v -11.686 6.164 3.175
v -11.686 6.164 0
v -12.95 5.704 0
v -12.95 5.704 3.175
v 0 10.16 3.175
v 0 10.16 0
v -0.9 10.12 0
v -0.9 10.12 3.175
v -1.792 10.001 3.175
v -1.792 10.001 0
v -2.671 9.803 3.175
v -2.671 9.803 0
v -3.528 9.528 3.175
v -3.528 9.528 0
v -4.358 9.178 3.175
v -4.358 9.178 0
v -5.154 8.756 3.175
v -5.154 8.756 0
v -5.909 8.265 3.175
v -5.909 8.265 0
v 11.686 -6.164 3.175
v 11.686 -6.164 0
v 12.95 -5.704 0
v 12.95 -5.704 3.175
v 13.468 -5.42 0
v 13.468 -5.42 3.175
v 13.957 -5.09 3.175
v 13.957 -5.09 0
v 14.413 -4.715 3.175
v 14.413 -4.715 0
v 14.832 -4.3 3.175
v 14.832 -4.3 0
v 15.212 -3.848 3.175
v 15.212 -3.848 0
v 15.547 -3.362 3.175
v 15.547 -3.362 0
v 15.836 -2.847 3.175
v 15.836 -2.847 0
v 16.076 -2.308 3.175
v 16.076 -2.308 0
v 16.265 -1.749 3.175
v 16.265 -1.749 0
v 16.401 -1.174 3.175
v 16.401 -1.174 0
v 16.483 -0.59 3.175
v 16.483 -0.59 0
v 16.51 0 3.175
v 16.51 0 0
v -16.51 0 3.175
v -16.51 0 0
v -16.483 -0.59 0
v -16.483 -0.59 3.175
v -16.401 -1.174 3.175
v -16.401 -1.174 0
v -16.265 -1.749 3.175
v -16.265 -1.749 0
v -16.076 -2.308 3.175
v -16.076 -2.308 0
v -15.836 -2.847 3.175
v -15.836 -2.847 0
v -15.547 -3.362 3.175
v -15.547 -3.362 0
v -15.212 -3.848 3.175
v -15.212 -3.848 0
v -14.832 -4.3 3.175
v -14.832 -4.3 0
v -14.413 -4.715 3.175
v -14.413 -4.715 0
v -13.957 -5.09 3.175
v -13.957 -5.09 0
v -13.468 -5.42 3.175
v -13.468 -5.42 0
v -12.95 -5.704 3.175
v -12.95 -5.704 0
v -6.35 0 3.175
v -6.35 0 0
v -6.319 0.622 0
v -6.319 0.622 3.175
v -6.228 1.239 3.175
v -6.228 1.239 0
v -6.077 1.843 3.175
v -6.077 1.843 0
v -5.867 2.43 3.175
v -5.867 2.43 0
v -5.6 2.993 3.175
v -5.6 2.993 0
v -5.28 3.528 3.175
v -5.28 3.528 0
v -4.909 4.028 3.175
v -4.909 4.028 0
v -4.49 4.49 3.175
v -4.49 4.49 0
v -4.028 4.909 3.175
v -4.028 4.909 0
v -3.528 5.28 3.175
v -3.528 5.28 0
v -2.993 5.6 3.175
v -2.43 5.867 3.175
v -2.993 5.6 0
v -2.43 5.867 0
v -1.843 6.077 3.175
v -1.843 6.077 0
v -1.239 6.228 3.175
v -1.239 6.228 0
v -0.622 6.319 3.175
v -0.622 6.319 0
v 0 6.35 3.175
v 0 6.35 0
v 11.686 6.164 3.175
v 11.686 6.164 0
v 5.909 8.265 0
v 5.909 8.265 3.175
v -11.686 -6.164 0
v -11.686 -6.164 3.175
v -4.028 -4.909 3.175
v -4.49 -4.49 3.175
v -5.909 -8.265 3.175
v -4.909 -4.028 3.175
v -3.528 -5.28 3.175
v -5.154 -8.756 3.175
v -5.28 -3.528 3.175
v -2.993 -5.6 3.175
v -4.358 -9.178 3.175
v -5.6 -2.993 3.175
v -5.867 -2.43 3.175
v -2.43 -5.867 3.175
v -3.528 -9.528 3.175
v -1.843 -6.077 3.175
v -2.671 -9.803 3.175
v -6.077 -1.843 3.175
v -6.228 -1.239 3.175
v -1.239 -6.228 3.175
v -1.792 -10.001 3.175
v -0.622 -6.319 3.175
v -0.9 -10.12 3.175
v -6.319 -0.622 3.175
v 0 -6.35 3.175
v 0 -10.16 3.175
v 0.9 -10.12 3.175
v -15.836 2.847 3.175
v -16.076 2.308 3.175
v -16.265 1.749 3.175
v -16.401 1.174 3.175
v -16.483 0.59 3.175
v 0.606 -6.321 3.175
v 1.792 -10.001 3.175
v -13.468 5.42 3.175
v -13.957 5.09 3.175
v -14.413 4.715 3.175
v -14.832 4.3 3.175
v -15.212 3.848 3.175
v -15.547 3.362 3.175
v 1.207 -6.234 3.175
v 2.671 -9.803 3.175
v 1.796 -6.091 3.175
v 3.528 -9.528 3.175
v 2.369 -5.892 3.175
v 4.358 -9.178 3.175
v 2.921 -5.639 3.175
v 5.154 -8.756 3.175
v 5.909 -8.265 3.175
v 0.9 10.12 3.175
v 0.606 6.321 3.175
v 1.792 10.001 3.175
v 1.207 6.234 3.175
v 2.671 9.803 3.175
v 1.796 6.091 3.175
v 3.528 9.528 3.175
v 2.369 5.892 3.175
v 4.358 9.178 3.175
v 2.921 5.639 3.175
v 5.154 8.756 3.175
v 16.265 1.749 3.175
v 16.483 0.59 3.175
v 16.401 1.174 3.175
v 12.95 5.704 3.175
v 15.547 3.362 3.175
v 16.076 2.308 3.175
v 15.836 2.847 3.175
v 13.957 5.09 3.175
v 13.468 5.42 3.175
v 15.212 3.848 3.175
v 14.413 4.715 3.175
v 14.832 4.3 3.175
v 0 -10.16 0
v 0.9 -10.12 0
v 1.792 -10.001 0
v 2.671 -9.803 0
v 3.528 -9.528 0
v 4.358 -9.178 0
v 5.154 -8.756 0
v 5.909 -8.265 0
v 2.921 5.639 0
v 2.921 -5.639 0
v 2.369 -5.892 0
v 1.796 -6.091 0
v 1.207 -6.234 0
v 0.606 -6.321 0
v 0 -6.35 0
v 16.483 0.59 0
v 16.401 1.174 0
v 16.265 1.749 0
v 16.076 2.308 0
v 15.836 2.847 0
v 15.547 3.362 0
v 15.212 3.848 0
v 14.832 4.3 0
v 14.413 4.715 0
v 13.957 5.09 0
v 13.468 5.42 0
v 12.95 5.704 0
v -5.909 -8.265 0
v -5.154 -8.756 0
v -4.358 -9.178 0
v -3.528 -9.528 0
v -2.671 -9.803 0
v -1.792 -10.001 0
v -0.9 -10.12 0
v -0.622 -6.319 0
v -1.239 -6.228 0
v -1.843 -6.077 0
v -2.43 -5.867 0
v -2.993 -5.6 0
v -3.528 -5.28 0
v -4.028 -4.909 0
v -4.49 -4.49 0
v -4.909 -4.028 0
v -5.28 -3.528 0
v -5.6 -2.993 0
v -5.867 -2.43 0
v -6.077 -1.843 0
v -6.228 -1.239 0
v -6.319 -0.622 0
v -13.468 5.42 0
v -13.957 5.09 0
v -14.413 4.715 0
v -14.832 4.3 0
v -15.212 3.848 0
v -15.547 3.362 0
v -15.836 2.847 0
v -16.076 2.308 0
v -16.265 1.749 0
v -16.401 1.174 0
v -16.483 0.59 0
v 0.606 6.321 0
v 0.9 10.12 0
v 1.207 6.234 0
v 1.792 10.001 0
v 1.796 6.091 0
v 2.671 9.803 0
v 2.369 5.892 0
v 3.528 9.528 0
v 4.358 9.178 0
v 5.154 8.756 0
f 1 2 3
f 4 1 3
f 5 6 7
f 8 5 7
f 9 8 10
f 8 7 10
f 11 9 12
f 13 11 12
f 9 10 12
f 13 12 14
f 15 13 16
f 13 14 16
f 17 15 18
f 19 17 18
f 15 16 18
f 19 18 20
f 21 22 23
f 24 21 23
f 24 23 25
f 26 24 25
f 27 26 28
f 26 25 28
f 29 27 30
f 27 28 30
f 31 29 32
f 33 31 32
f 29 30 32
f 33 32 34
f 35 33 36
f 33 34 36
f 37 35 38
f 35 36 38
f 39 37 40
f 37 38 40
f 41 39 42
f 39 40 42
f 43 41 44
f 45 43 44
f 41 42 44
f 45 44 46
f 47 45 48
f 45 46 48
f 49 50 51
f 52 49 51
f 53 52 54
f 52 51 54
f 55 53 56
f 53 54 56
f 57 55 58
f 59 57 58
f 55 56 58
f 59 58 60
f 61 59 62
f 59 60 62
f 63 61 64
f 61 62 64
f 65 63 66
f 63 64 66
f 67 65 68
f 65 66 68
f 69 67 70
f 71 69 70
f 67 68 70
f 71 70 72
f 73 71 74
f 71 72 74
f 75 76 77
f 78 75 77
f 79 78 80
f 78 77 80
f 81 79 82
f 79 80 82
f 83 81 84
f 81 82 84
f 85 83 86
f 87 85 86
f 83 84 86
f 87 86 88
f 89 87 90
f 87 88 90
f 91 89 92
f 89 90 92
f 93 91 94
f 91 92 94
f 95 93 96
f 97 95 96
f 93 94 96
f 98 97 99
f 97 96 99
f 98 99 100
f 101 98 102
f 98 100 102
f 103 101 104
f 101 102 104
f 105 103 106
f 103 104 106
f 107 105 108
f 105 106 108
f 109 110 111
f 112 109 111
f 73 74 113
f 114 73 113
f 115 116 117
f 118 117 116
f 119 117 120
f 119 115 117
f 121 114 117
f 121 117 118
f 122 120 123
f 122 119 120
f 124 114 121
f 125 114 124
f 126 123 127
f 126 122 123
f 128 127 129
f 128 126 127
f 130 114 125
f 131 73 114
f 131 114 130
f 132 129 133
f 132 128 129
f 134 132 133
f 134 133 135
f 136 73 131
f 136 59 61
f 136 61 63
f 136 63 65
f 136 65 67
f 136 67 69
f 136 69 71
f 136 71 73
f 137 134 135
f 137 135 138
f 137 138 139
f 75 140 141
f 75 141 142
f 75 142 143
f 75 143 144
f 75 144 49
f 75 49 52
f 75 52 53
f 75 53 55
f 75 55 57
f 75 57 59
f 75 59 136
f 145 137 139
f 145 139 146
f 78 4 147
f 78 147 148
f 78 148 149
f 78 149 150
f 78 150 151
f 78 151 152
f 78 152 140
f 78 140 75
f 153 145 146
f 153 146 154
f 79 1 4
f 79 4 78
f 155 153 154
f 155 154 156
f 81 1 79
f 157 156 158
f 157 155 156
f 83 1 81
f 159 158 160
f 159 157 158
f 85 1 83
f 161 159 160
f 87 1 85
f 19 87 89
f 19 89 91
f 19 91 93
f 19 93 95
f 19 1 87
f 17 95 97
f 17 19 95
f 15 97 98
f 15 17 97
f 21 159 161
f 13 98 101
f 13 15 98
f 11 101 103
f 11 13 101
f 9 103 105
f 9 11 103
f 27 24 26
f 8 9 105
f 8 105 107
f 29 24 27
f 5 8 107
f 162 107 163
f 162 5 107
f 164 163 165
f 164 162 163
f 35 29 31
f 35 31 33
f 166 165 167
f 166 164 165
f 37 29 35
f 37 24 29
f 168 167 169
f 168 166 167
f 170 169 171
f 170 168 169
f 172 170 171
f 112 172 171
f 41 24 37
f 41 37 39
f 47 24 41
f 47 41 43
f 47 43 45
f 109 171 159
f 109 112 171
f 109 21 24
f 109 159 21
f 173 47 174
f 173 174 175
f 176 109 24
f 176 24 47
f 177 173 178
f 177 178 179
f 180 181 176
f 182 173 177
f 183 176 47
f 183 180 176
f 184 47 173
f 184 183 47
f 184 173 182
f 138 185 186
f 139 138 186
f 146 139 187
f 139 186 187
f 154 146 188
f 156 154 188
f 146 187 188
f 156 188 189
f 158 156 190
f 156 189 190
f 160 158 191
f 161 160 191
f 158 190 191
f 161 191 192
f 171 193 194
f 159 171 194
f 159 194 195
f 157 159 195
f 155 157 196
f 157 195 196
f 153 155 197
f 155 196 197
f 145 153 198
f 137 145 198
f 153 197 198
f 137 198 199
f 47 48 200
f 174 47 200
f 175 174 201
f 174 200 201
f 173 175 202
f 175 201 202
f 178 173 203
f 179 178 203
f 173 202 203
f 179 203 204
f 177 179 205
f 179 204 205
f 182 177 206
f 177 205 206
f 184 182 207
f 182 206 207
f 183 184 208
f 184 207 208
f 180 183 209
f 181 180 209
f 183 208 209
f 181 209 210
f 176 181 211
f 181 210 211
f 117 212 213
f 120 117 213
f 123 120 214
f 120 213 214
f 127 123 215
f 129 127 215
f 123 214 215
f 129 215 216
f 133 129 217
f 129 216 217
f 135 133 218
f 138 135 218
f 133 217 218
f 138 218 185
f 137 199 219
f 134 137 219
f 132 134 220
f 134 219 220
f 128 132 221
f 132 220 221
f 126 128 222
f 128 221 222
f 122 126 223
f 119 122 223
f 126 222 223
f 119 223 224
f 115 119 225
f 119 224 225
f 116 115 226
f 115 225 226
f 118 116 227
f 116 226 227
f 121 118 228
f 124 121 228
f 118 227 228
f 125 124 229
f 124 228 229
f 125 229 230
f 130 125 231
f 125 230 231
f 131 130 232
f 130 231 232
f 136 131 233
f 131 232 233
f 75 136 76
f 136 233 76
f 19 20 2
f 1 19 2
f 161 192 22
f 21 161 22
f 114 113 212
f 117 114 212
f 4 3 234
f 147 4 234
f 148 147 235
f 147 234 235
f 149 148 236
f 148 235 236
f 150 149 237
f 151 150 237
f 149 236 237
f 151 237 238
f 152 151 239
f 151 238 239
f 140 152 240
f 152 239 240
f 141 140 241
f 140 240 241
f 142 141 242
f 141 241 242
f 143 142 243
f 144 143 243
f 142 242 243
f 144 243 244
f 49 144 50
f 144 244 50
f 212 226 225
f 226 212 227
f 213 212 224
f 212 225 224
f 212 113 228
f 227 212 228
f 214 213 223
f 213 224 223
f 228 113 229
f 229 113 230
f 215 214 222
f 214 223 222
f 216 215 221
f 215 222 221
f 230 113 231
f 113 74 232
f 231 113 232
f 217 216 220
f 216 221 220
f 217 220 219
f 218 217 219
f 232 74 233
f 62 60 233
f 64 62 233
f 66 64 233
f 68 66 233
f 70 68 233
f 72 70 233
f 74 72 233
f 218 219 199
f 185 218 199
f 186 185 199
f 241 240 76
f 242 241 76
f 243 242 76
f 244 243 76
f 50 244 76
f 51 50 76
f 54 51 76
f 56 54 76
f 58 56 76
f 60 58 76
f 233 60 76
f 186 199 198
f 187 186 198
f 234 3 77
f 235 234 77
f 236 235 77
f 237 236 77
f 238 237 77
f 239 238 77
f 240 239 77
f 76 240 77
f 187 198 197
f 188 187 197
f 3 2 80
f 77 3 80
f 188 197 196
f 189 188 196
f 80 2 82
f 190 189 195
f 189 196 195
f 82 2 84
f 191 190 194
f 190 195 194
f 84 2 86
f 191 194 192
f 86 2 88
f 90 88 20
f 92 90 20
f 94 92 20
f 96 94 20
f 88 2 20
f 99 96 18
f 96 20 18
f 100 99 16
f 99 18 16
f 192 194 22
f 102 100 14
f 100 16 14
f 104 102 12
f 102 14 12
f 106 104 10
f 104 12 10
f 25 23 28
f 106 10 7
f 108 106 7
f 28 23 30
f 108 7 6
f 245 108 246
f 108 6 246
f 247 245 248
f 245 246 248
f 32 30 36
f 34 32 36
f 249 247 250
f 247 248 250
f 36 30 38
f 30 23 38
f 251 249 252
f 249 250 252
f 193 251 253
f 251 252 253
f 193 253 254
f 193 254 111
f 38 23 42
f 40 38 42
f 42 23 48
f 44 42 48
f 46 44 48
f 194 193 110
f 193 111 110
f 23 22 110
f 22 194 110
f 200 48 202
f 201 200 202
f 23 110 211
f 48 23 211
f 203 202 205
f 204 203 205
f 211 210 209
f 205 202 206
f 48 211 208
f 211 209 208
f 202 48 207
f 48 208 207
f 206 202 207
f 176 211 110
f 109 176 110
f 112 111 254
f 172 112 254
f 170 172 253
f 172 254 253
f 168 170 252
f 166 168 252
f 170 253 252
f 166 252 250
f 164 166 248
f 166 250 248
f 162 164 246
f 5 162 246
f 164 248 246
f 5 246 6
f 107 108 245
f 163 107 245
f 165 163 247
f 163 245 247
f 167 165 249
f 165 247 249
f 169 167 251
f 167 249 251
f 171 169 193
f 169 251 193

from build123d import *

# Parameters (mm, degrees)
F1_DEPTH = 3.175


with BuildPart() as f1:
    # F0 (on Top) → F1 (new body)
    with BuildSketch(Plane.XY):
        with BuildLine():
            ThreePointArc((5.908962, 8.264972), (3.102699, 9.67465), (0, 10.16))
            ThreePointArc((0, 10.16), (-3.102699, 9.67465), (-5.908962, 8.264972))
            Line((-5.908962, 8.264972), (-11.686093, 6.16389))
            Line((-11.686093, 6.16389), (-12.950189, 5.704151))
            ThreePointArc((-12.950189, 5.704151), (-15.547031, 3.361904), (-16.51, 0))
            ThreePointArc((-16.51, 0), (-15.547031, -3.361904), (-12.950189, -5.704151))
            Line((-12.950189, -5.704151), (-11.686093, -6.16389))
            Line((-11.686093, -6.16389), (-5.908962, -8.264972))
            ThreePointArc((-5.908962, -8.264972), (-3.102699, -9.67465), (0, -10.16))
            ThreePointArc((0, -10.16), (3.102699, -9.67465), (5.908962, -8.264972))
            Line((5.908962, -8.264972), (11.686093, -6.16389))
            Line((11.686093, -6.16389), (12.950189, -5.704151))
            ThreePointArc((12.950189, -5.704151), (15.547031, -3.361904), (16.51, 0))
            ThreePointArc((16.51, 0), (15.547031, 3.361904), (12.950189, 5.704151))
            Line((12.950189, 5.704151), (11.686093, 6.16389))
            Line((11.686093, 6.16389), (5.908962, 8.264972))
        make_face()
        with BuildLine():
            ThreePointArc((-6.35, 0), (-4.490128, 4.490128), (0, 6.35))
            ThreePointArc((0, 6.35), (1.502973, 6.169568), (2.920534, 5.638527))
            Line((2.920534, 5.638527), (2.920534, 0))
            Line((2.920534, 0), (2.920534, -5.638527))
            ThreePointArc((2.920534, -5.638527), (1.502973, -6.169568), (0, -6.35))
            ThreePointArc((0, -6.35), (-4.490128, -4.490128), (-6.35, 0))
        make_face(mode=Mode.SUBTRACT)
    extrude(amount=F1_DEPTH)


solid = f1.part
